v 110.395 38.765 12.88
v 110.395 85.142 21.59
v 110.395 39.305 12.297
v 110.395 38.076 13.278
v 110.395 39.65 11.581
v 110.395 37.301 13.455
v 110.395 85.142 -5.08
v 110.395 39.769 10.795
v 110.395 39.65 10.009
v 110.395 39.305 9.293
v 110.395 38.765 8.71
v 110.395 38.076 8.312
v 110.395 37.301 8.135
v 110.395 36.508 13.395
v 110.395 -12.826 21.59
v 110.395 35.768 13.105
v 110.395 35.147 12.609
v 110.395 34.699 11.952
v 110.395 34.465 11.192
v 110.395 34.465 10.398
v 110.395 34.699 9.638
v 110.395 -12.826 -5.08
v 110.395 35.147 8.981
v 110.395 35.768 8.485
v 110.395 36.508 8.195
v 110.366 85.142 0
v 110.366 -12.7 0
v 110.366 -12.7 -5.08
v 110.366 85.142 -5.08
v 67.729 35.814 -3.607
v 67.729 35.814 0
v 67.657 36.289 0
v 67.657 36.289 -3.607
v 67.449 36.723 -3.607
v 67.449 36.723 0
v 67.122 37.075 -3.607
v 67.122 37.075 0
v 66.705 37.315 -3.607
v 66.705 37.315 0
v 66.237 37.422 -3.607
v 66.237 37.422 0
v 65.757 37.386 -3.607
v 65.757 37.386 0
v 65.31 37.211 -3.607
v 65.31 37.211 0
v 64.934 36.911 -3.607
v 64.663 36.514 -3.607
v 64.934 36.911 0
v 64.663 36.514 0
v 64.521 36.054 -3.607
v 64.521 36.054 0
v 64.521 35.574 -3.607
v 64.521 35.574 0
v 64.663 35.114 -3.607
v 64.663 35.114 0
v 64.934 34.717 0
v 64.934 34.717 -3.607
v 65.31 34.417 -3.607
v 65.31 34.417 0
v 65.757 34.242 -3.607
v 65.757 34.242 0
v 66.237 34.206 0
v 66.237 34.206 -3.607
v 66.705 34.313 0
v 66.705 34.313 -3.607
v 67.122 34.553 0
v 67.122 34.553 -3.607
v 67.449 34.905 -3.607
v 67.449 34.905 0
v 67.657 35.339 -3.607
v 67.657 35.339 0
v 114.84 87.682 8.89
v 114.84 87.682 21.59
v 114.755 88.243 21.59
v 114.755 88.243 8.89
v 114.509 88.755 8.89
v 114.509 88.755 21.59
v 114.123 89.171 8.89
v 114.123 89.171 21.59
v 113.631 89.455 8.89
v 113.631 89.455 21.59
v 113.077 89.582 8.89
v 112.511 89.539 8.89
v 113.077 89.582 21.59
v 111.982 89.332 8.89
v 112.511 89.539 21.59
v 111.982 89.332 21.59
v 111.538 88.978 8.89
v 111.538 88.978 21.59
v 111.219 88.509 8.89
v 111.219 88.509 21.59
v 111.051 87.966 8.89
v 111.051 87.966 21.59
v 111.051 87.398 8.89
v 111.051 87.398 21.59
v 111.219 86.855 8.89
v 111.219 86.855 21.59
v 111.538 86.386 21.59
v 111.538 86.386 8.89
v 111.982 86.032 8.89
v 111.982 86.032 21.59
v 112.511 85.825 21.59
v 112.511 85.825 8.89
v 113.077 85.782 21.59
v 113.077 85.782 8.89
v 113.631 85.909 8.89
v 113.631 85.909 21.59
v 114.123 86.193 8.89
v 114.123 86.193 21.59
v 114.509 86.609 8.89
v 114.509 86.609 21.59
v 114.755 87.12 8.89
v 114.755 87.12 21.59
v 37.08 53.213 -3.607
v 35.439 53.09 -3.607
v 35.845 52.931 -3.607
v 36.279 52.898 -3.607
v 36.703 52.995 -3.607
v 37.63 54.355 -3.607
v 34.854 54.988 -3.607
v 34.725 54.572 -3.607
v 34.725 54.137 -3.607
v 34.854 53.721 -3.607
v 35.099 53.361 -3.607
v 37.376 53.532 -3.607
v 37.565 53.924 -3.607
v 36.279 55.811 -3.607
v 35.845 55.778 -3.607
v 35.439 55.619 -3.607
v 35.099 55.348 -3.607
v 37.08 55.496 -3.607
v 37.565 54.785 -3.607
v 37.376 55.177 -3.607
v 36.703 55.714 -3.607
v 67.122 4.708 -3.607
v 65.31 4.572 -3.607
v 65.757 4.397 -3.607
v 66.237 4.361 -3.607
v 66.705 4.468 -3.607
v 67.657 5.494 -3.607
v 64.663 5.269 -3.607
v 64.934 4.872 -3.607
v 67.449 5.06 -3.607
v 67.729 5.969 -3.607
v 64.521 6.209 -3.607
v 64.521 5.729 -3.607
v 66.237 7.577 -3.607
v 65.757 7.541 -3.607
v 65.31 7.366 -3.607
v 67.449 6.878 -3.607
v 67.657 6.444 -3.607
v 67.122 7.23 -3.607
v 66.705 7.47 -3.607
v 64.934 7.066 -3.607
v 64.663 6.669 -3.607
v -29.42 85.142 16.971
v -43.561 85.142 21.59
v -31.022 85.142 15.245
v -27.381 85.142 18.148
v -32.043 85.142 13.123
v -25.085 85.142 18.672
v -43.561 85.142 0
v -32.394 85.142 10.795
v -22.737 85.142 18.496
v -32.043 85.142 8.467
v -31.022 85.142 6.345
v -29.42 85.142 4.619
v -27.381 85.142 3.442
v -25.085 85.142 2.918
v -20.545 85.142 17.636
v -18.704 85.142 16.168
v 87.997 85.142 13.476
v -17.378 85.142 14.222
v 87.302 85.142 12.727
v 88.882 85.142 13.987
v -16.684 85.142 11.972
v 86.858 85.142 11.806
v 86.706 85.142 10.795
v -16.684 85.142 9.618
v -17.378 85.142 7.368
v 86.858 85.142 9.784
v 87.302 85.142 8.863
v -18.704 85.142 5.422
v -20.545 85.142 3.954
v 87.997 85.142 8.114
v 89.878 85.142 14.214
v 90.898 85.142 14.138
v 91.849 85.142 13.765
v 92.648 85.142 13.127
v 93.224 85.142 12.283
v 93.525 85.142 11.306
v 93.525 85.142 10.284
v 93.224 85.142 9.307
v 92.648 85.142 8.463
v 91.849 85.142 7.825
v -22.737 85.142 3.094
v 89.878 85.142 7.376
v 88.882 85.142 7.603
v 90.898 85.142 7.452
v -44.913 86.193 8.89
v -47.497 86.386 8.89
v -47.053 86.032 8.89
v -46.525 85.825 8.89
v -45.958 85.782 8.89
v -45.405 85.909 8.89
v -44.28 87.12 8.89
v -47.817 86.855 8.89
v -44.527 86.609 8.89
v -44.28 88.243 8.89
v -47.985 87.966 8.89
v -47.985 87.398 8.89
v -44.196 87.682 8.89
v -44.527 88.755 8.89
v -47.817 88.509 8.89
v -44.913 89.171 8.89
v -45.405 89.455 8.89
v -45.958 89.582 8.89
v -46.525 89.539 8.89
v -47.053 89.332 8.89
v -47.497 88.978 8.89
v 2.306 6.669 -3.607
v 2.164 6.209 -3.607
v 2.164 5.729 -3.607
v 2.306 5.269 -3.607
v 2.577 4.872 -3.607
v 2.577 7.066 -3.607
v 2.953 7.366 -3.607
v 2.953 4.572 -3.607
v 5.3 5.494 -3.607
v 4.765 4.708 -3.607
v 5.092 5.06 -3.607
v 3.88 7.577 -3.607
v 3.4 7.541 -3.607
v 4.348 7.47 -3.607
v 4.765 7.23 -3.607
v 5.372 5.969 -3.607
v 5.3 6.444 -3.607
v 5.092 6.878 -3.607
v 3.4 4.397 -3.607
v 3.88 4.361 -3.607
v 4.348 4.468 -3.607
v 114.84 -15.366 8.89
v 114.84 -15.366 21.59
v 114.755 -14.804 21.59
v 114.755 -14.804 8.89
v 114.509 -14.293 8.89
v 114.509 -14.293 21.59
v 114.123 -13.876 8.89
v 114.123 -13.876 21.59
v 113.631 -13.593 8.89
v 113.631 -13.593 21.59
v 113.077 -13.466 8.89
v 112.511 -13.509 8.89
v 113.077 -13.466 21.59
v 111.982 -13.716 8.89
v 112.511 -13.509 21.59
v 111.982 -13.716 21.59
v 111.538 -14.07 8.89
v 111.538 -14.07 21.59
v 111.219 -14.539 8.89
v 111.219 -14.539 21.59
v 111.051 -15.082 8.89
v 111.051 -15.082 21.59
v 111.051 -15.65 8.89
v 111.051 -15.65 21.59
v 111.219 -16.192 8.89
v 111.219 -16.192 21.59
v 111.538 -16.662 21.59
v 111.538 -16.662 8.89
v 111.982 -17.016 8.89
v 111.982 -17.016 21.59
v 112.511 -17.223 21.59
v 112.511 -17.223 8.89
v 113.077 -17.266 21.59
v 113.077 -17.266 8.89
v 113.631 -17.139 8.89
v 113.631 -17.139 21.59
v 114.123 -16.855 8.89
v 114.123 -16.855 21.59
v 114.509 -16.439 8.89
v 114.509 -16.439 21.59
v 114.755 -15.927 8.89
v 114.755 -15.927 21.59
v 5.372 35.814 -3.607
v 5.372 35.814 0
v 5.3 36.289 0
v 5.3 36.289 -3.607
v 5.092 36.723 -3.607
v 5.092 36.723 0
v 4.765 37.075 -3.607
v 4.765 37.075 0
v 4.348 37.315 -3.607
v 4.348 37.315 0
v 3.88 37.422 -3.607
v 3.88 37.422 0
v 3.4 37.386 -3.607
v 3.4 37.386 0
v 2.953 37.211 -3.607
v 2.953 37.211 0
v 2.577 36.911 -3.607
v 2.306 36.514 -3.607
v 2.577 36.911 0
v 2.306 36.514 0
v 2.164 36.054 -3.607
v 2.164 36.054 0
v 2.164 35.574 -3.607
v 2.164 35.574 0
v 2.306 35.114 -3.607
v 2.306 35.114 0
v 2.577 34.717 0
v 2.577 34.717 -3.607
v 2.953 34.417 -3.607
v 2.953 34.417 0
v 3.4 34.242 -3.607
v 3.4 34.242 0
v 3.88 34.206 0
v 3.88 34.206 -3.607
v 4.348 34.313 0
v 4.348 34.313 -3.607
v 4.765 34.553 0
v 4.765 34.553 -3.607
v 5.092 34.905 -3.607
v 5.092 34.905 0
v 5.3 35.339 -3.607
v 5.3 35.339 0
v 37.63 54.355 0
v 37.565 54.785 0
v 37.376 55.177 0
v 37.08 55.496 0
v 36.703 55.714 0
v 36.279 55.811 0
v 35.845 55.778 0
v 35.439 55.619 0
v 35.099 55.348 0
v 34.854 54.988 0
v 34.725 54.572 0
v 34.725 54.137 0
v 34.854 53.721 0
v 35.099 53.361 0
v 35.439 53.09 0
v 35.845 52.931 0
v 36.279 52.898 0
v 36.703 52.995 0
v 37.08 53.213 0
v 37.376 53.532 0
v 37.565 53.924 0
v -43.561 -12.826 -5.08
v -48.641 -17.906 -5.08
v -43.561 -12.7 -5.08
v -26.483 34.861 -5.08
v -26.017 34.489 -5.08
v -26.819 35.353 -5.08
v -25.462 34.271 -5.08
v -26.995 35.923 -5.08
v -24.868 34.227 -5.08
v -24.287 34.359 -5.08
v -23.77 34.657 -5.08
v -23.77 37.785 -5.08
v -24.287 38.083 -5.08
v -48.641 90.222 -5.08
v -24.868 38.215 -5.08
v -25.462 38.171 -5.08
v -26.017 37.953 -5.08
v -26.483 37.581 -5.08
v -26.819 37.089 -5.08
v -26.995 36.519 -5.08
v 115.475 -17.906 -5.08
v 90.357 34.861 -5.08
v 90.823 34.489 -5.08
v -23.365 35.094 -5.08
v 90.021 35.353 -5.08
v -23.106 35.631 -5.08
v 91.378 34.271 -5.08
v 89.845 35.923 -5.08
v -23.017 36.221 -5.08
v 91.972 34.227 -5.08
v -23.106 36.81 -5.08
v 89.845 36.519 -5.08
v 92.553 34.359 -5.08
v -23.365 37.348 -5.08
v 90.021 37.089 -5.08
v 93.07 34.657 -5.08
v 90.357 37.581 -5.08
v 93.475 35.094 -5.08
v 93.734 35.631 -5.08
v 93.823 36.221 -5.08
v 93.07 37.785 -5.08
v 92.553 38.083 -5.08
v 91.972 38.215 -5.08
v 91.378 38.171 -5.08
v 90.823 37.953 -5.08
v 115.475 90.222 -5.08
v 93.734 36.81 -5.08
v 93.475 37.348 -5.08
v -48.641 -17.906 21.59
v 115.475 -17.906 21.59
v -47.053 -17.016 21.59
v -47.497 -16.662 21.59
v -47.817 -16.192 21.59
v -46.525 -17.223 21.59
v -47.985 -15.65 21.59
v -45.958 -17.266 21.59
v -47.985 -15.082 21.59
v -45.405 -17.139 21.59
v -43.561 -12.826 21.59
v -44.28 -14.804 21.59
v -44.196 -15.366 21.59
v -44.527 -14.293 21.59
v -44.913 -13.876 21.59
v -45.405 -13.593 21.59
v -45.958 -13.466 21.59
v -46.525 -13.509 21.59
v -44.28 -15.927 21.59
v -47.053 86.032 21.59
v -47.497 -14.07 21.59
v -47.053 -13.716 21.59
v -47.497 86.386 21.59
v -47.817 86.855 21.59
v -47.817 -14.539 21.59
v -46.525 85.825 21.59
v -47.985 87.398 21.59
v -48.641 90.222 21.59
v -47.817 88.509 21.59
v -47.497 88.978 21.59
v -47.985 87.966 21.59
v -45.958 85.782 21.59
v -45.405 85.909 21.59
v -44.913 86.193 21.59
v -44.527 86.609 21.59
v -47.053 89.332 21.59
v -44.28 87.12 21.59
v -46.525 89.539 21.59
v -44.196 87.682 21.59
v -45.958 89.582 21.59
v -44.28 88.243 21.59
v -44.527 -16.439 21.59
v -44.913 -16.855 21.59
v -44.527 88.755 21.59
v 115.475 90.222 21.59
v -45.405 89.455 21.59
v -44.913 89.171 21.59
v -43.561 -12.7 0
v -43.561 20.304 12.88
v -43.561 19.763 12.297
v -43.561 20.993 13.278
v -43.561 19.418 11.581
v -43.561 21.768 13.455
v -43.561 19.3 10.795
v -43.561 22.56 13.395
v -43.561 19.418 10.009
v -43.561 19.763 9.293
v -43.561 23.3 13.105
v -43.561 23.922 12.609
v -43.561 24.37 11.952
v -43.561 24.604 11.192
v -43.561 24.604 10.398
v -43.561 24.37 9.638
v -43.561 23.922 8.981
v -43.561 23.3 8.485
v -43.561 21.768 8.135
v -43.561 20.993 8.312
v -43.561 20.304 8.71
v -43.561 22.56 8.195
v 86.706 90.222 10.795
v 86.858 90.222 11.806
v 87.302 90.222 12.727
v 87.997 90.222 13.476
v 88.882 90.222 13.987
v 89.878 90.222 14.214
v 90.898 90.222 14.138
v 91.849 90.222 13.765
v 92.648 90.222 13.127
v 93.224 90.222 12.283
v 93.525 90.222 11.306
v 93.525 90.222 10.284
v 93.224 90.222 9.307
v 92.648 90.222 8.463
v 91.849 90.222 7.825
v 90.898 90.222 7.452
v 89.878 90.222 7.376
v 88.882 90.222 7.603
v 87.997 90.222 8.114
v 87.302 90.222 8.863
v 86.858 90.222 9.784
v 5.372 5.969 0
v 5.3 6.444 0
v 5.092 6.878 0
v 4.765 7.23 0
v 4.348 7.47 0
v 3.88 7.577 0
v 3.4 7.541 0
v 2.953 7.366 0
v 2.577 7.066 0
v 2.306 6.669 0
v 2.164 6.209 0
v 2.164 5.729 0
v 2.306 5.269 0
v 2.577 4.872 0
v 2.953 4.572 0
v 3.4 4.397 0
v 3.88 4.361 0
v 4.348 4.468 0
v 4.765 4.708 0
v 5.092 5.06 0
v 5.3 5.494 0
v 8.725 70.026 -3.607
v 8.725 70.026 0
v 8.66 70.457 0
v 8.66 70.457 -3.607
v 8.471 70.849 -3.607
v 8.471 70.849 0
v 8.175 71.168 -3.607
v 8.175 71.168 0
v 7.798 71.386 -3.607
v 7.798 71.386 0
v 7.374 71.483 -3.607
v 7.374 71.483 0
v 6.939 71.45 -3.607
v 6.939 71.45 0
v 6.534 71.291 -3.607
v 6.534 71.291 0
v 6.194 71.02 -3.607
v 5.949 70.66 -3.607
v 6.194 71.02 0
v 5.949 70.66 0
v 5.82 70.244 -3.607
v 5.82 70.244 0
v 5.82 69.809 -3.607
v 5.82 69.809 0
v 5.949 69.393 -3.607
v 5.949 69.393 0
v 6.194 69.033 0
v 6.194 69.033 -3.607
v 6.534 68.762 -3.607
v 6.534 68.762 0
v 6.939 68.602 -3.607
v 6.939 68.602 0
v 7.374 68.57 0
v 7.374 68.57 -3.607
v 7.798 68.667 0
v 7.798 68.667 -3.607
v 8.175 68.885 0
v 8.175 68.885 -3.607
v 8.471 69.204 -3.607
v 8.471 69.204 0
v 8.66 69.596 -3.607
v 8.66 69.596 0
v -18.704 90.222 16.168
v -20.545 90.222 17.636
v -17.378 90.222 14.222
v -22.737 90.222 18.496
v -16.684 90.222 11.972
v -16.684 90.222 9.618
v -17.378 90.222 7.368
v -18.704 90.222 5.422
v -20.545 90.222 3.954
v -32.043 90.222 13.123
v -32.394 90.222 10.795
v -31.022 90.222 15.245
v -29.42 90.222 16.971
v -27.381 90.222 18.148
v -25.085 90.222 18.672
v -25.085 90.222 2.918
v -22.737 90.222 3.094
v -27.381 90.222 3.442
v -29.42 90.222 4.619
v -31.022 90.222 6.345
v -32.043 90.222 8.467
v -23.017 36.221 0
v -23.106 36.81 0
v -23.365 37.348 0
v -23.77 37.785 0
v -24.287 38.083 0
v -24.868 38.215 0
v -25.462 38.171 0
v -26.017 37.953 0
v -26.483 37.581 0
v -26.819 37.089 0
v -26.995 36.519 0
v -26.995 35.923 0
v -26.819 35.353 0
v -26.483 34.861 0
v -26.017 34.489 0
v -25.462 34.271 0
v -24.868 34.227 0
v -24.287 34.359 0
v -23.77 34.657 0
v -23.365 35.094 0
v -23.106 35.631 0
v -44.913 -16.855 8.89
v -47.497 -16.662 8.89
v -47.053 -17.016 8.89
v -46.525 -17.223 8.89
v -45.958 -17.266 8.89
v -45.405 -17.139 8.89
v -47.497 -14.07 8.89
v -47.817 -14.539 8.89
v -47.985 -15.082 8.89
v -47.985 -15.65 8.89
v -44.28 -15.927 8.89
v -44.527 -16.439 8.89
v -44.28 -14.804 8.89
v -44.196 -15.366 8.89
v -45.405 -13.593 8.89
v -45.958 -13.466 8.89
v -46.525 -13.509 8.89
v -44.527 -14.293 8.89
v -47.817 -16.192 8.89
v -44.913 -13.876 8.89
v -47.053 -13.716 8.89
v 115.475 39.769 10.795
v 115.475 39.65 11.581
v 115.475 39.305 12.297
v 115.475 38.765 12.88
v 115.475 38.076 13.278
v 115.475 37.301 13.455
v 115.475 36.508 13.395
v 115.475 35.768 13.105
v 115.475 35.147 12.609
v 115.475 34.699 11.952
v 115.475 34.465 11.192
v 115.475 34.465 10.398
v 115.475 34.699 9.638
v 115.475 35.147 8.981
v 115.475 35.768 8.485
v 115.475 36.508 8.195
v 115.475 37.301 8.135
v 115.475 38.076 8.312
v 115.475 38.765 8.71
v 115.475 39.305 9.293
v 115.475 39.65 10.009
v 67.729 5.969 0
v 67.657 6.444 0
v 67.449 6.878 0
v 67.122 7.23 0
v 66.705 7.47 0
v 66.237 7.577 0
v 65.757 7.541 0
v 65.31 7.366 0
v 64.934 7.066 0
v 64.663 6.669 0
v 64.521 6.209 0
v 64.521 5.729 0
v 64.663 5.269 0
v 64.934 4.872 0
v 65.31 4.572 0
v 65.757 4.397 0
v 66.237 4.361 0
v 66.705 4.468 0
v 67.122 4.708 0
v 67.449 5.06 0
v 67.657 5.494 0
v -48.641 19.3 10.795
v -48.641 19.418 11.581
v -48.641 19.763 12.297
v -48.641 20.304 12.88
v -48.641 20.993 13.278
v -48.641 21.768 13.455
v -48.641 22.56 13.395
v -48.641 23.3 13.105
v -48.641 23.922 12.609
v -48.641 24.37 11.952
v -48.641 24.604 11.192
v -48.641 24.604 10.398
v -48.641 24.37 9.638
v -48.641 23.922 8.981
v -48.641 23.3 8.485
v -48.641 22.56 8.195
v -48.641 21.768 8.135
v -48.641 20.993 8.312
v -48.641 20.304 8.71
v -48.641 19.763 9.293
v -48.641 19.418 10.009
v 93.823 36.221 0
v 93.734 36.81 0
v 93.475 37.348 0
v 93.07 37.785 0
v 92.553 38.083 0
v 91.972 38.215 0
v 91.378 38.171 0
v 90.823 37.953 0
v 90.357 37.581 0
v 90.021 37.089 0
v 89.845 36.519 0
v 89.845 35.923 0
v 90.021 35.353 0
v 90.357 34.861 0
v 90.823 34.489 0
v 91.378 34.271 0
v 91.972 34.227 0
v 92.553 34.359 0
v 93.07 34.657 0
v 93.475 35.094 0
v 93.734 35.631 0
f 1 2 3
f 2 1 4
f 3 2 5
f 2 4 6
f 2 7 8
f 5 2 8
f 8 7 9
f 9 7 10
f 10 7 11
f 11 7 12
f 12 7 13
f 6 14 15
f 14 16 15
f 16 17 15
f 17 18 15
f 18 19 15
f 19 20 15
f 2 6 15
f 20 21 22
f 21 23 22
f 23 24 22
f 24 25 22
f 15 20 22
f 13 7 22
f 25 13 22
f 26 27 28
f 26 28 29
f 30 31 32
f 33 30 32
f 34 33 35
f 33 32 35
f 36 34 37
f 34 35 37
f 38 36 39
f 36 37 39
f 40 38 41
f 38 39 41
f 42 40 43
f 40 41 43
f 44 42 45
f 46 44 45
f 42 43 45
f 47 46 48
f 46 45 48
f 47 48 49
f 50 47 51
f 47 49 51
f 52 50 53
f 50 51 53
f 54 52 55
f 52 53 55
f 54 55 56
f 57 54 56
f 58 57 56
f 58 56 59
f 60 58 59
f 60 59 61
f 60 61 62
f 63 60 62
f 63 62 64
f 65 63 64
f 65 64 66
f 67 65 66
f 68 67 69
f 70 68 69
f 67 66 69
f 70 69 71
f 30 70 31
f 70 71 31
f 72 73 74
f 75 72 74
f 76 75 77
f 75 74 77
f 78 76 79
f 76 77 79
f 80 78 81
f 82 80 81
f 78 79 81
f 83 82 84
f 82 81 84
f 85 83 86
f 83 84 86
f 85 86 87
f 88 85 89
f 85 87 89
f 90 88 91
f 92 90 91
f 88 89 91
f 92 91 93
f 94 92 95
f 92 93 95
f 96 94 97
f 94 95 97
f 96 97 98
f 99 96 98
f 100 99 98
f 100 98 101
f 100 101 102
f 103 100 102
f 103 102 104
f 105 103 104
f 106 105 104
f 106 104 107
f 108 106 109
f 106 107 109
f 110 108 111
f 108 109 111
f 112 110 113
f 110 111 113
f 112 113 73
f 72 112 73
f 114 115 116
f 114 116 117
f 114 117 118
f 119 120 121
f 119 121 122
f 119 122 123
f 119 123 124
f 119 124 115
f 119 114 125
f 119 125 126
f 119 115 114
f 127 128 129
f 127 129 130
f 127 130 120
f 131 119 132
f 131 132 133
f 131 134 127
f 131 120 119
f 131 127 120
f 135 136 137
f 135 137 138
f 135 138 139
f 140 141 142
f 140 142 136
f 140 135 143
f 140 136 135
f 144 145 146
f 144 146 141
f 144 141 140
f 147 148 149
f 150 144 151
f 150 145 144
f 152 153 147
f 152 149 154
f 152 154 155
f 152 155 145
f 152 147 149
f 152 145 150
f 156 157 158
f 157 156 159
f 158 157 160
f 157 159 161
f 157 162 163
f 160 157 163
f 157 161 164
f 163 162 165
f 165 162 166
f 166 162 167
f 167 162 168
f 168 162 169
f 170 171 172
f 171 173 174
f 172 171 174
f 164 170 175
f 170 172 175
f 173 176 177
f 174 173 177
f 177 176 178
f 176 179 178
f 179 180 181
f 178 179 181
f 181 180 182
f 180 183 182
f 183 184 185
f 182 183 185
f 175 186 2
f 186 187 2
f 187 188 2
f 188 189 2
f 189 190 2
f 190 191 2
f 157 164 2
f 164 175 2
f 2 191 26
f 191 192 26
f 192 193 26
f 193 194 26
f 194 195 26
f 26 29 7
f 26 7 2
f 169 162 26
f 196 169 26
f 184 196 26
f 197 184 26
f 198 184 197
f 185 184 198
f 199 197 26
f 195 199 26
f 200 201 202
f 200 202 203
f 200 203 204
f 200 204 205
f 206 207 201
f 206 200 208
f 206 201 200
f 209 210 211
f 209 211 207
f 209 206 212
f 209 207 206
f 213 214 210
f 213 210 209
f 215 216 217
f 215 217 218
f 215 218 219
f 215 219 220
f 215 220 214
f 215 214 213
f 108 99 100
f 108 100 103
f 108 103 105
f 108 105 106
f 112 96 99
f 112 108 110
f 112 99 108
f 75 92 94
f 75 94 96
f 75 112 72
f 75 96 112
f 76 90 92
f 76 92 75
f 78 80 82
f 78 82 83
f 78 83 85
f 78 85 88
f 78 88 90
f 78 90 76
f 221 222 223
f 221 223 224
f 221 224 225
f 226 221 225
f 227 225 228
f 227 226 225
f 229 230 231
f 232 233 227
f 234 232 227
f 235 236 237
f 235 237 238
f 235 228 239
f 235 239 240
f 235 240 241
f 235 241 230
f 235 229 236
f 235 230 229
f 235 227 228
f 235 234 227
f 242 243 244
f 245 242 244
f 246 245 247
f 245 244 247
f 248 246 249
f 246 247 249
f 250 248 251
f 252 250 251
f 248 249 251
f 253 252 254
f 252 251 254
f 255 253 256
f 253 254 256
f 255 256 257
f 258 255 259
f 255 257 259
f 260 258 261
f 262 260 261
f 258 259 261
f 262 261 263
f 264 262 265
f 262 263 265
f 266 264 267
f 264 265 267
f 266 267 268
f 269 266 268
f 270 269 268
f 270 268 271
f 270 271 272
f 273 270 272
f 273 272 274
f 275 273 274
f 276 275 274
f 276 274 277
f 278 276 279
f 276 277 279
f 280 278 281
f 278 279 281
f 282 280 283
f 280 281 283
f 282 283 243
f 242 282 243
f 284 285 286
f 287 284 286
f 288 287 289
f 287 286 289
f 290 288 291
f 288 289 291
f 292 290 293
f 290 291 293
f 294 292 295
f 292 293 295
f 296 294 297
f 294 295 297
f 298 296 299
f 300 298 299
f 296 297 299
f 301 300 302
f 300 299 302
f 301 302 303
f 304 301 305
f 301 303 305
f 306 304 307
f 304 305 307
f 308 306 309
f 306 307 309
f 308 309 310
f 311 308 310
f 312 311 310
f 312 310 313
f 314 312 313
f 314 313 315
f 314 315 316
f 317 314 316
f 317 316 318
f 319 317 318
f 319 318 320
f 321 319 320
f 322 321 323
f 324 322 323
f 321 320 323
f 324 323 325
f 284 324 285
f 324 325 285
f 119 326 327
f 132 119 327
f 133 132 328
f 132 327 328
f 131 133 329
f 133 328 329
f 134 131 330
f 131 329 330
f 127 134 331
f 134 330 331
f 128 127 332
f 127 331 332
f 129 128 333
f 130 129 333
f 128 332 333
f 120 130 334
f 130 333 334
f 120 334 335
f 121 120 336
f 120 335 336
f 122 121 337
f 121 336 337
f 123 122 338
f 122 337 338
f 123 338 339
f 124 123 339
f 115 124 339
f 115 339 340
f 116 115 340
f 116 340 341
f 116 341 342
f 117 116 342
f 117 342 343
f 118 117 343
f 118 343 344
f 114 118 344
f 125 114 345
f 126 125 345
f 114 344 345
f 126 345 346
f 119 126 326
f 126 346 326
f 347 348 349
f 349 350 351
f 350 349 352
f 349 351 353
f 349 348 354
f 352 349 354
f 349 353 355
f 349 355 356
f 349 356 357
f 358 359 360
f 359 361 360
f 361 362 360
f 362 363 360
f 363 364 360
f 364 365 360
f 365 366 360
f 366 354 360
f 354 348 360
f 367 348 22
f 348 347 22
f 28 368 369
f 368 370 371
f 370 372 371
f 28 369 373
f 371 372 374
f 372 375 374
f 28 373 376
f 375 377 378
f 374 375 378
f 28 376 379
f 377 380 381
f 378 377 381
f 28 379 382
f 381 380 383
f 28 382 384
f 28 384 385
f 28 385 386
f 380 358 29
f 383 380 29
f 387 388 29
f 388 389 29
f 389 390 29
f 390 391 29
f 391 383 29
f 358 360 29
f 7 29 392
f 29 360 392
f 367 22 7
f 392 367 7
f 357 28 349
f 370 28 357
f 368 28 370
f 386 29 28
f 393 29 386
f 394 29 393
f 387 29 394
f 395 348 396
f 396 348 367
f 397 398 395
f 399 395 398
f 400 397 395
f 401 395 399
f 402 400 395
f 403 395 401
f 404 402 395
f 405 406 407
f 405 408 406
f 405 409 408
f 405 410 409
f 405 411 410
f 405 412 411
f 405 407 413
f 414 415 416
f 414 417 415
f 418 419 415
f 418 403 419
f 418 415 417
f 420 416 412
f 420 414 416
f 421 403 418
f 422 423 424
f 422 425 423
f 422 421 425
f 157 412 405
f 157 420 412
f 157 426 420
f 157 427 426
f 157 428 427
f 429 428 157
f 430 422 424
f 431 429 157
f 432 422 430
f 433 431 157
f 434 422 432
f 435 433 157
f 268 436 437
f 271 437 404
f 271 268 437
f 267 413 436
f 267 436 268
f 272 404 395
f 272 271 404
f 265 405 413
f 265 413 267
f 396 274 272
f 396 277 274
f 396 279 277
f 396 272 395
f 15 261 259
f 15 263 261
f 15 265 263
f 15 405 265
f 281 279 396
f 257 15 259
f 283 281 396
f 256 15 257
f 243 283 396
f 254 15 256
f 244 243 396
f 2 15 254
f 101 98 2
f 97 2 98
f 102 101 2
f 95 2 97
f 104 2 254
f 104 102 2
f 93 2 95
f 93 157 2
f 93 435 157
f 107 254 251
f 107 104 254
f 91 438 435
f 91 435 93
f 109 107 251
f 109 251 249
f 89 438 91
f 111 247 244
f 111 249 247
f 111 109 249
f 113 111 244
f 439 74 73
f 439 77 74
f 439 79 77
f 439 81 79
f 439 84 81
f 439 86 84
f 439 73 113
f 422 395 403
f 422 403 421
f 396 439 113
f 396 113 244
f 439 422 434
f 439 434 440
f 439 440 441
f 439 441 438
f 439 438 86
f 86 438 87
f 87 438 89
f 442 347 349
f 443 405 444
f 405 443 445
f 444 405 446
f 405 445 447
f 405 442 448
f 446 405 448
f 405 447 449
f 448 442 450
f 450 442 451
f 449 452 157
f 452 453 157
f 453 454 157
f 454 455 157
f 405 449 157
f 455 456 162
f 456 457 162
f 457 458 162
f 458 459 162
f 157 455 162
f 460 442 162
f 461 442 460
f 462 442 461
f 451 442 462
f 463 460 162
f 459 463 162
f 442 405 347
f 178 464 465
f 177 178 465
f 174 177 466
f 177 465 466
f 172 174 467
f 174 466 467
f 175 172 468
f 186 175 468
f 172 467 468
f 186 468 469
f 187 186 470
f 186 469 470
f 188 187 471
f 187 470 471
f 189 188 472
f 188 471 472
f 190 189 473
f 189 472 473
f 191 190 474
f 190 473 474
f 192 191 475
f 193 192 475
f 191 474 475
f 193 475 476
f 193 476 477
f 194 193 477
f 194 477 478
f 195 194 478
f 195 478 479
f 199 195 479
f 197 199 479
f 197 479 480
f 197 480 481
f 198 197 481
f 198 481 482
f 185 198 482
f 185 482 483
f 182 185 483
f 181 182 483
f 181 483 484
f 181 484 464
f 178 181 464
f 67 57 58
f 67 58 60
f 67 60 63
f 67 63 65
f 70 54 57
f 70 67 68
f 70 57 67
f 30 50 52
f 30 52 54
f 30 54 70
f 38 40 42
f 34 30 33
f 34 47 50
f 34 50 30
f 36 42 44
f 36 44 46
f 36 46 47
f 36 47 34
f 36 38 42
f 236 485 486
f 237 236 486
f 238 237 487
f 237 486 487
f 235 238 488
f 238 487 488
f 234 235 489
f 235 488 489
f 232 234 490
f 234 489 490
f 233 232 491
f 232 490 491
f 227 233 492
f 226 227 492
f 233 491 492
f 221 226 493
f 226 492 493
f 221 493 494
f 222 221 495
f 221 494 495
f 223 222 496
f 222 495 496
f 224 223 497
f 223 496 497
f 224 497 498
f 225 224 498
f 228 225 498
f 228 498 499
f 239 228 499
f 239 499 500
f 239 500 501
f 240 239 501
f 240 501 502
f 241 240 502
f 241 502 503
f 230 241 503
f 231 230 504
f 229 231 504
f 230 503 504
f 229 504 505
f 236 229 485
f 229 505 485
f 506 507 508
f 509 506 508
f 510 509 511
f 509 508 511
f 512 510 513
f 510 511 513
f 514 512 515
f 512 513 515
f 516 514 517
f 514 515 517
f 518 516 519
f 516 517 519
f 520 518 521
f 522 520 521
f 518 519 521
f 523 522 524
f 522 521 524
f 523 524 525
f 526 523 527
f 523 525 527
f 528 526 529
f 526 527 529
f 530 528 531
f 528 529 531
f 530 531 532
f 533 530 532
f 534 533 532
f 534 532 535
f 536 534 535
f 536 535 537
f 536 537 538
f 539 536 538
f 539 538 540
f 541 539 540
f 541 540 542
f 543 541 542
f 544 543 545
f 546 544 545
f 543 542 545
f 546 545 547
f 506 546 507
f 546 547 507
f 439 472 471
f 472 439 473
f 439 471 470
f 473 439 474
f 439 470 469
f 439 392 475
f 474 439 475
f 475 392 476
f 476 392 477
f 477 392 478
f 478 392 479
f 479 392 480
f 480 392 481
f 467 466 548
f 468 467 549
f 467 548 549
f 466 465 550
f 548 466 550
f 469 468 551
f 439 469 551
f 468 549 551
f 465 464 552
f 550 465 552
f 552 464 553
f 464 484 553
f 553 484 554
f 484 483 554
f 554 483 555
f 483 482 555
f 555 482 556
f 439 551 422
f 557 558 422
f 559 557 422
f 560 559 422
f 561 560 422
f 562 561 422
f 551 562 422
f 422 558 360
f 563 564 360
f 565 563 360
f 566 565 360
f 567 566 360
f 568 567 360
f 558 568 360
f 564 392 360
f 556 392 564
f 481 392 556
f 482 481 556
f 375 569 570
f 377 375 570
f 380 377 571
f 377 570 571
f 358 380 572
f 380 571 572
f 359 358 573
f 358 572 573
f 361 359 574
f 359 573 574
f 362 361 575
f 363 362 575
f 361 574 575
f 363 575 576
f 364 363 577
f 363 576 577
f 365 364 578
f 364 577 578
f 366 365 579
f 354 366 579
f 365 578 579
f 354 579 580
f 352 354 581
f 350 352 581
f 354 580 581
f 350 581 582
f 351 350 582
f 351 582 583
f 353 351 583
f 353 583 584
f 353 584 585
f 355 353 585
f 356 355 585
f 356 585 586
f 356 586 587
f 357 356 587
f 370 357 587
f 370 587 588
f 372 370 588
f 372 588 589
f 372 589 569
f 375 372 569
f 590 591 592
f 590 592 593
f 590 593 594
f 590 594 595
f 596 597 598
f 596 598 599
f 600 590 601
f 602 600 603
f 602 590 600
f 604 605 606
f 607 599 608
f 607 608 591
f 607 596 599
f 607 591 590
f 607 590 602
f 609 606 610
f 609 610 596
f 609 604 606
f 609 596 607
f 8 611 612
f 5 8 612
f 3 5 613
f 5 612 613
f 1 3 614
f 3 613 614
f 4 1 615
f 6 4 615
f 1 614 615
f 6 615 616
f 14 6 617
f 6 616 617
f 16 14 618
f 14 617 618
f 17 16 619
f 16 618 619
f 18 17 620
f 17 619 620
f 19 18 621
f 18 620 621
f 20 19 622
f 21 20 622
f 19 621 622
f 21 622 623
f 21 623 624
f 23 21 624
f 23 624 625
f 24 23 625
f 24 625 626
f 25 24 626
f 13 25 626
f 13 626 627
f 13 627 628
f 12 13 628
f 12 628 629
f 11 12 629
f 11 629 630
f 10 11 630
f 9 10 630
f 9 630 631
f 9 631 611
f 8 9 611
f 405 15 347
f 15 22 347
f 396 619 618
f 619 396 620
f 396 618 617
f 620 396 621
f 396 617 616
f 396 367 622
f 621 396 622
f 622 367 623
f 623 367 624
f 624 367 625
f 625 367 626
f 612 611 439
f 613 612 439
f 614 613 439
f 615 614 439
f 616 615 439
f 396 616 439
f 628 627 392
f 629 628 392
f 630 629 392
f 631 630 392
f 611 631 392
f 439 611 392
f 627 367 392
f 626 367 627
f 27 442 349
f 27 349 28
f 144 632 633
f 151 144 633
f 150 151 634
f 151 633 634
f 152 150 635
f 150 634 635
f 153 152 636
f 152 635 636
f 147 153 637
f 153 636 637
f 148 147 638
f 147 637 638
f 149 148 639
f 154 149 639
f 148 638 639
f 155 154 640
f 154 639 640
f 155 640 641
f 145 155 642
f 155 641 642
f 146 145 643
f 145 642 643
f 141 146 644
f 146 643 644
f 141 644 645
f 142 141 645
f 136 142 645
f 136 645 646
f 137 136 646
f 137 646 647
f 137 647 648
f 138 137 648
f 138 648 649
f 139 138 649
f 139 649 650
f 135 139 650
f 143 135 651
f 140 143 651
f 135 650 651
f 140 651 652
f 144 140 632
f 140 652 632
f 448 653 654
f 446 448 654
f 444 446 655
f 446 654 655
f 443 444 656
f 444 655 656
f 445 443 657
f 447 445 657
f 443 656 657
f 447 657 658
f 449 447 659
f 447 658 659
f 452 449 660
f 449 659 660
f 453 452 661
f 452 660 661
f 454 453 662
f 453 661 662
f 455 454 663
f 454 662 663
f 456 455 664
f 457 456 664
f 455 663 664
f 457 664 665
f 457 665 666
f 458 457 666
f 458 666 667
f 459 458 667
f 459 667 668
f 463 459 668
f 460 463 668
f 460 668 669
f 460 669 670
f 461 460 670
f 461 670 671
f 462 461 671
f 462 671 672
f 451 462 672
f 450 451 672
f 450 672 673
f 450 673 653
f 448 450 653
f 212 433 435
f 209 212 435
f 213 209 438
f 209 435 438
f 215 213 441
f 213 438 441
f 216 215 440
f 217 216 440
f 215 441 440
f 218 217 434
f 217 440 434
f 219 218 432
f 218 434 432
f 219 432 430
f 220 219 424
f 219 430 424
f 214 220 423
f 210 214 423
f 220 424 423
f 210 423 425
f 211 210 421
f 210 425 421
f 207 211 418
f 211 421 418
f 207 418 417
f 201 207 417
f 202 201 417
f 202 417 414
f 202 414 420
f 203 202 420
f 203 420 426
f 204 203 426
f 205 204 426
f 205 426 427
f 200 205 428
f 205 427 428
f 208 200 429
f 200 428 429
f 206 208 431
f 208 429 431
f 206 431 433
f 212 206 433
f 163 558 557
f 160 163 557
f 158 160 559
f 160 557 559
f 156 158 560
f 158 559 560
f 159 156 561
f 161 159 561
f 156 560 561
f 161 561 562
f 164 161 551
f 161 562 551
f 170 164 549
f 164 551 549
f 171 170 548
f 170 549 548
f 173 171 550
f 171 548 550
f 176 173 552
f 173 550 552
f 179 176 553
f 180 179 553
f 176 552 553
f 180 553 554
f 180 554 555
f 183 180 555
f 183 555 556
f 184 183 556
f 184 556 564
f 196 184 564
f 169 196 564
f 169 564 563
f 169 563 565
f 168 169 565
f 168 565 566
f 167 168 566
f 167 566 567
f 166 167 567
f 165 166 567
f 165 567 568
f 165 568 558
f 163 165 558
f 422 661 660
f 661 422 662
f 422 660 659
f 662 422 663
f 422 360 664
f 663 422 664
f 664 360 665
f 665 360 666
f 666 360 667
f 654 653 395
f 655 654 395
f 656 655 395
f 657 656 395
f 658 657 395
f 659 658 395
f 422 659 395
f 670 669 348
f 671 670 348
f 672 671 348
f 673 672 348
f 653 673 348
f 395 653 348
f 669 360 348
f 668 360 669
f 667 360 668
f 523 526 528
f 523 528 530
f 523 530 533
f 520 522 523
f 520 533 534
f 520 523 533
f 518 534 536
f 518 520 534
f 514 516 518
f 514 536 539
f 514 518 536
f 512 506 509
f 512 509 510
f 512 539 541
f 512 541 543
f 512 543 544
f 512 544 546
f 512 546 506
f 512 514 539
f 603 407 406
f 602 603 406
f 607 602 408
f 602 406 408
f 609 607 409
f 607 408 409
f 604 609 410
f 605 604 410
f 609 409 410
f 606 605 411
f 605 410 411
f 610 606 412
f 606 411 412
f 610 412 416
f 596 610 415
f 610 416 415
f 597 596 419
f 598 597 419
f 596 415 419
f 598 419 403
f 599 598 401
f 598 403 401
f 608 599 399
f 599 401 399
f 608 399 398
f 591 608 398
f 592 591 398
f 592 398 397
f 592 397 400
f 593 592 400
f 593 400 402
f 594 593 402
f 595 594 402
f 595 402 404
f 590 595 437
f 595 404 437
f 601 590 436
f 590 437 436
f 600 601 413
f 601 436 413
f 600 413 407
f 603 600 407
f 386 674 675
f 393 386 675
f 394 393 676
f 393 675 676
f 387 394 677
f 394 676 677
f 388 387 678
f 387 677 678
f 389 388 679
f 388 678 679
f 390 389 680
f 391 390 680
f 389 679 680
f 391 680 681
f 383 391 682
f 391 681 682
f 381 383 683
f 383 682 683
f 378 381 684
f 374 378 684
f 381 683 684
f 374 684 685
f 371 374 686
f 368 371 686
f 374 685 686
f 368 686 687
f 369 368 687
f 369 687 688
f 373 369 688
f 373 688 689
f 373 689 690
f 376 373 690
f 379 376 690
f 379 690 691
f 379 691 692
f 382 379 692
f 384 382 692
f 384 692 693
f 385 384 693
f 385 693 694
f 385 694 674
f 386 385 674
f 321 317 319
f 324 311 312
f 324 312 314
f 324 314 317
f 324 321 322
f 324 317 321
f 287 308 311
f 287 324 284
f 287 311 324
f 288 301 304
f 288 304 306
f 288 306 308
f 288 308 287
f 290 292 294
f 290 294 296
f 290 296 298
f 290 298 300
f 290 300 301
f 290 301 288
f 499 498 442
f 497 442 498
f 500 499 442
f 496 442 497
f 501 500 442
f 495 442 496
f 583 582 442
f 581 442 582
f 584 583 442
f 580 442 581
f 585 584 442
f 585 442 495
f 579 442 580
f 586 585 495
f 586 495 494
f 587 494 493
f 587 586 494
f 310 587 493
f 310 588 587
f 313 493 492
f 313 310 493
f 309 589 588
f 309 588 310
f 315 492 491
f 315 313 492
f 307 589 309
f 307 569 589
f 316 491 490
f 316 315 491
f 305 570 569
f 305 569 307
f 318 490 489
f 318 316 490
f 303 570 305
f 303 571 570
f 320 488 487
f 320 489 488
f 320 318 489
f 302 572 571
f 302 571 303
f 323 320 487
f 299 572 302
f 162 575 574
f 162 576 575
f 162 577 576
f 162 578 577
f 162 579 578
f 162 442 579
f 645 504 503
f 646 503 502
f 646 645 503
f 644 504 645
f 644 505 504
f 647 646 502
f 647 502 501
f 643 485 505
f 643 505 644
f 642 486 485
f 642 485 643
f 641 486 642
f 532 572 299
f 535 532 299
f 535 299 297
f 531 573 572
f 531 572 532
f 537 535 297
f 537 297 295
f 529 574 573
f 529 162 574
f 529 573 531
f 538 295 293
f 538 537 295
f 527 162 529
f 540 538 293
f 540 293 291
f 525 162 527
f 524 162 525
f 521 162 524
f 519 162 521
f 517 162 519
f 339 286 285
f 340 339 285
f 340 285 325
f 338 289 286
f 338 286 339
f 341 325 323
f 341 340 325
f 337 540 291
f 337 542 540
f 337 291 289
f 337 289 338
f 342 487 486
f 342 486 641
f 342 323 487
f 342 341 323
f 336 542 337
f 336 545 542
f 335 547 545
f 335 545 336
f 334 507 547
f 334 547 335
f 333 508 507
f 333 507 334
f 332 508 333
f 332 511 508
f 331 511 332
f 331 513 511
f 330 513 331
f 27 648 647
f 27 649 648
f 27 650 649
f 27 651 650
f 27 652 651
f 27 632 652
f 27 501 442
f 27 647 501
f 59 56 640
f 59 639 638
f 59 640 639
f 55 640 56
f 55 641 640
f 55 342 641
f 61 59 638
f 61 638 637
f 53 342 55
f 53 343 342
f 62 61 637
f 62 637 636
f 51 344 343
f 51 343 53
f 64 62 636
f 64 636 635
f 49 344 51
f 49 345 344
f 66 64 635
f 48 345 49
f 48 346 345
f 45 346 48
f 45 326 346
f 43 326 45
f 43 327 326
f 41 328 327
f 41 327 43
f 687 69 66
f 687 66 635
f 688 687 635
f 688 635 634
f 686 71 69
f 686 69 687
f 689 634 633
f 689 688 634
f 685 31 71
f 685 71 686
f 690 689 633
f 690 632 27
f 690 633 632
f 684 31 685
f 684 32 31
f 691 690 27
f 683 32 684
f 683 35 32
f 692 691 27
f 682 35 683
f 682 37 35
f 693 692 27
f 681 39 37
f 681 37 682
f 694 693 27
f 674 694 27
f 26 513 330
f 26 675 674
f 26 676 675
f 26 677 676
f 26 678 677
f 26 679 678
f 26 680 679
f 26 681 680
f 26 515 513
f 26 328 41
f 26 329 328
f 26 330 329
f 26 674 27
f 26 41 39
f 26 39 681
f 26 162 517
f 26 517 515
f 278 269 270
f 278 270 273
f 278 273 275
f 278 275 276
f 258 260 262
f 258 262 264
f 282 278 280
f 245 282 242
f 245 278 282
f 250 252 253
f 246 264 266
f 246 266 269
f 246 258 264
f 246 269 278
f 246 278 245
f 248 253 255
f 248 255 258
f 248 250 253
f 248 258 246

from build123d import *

# Parameters (mm, degrees)
F3_DEPTH  = 5.08
F6_DEPTH  = 5.08
F7_DEPTH  = 21.59
F8_R      = 7.8994
F9_DEPTH  = 25.4
F10_R     = 3.429
F11_DEPTH = 25.4
F12_R     = 2.667
F13_DEPTH = 25.4
F14_R     = 2.667
F15_DEPTH = 25.4
F1_R      = 1.4605
F16_DEPTH = 3.6068
F0_R      = 1.6129
F17_DEPTH = 3.6068
F18_R     = 1.905
F19_DEPTH = 12.7
F20_R     = 2
F21_DEPTH = 25.4


with BuildPart() as f3:
    # F2 (on Top) → F3 (new body)
    with BuildSketch(Plane.XY):
        Polygon((-43.589437, -12.7), (0, -12.7), (110.36633, -12.7), (110.36633, 85.2678), (0, 85.2678), (-43.589437, 85.2678), (-43.589437, 72.5678), (-43.589437, 0), align=None)
    extrude(amount=-F3_DEPTH)

    # F4 (on Top) → F6 (join)
    with BuildSketch(Plane.XY):
        Polygon((110.394933, 90.221972), (-5.796864, 90.221972), (-43.560833, 90.221972), (-48.640833, 90.221972), (-48.640833, 85.141972), (-48.640833, -12.825828), (-48.640833, -17.905828), (-43.560833, -17.905828), (-5.796864, -17.905828), (110.394933, -17.905828), (115.474933, -17.905828), (115.474933, -12.825828), (115.474933, 85.141972), (115.474933, 90.221972), align=None)
        Polygon((110.394933, -12.825828), (-5.796864, -12.825828), (-43.560833, -12.825828), (-43.560833, 85.141972), (-5.796864, 85.141972), (110.394933, 85.141972), align=None, mode=Mode.SUBTRACT)
    extrude(amount=-F6_DEPTH)

    # F5 (on face) → F7 (join)
    with BuildSketch(Plane.XY):
        Polygon((110.394933, 90.221972), (-5.796864, 90.221972), (-43.560833, 90.221972), (-48.640833, 90.221972), (-48.640833, 85.141972), (-48.640833, -12.825828), (-48.640833, -17.905828), (-43.560833, -17.905828), (-5.796864, -17.905828), (110.394933, -17.905828), (115.474933, -17.905828), (115.474933, 48.9839), (115.474933, 90.221972), align=None)
        Polygon((110.394933, -12.825828), (-5.796864, -12.825828), (-43.560833, -12.825828), (-43.560833, 85.141972), (-5.796864, 85.141972), (110.394933, 85.141972), align=None, mode=Mode.SUBTRACT)
    extrude(amount=F7_DEPTH)

    # F8 (on face) → F9 (cut)
    with BuildSketch(Plane(origin=(0, 90.221972, 0), x_dir=(-1, 0, 0), z_dir=(0, 1, 0))):
        with Locations((24.494825, 10.795)):
            Circle(F8_R)
    extrude(amount=-F9_DEPTH, mode=Mode.SUBTRACT)

    # F10 (on face) → F11 (cut)
    with BuildSketch(Plane(origin=(0, 90.221972, 0), x_dir=(-1, 0, 0), z_dir=(0, 1, 0))):
        with Locations((-90.13474, 10.795)):
            Circle(F10_R)
    extrude(amount=-F11_DEPTH, mode=Mode.SUBTRACT)

    # F12 (on face) → F13 (cut)
    with BuildSketch(Plane(origin=(-48.640833, 0, 0), x_dir=(0, -1, 0), z_dir=(-1, 0, 0))):
        with Locations((-21.966936, 10.795)):
            Circle(F12_R)
    extrude(amount=-F13_DEPTH, mode=Mode.SUBTRACT)

    # F14 (on face) → F15 (cut)
    with BuildSketch(Plane.YZ.offset(115.474933)):
        with Locations((37.101891, 10.795)):
            Circle(F14_R)
    extrude(amount=-F15_DEPTH, mode=Mode.SUBTRACT)

    # F1 (on Top) → F16 (cut)
    with BuildSketch(Plane.XY):
        with Locations((7.2644, 70.026379)):
            Circle(F1_R)
        with Locations((36.1696, 54.354579)):
            Circle(F1_R)
    extrude(amount=-F16_DEPTH, mode=Mode.SUBTRACT)

    # F0 (on Top) → F17 (cut)
    with BuildSketch(Plane.XY):
        with Locations((3.7592, 35.814)):
            Circle(F0_R)
        with Locations((3.7592, 5.969)):
            Circle(F0_R)
        with Locations((66.1162, 5.969)):
            Circle(F0_R)
        with Locations((66.1162, 35.814)):
            Circle(F0_R)
    extrude(amount=-F17_DEPTH, mode=Mode.SUBTRACT)

    # F18 (on face) → F19 (cut)
    with BuildSketch(Plane.XY.offset(21.59)):
        with Locations((-46.100833, -15.365828)):
            Circle(F18_R)
        with Locations((-46.100833, 87.681972)):
            Circle(F18_R)
        with Locations((112.934933, 87.681972)):
            Circle(F18_R)
        with Locations((112.934933, -15.365828)):
            Circle(F18_R)
    extrude(amount=-F19_DEPTH, mode=Mode.SUBTRACT)

    # F20 (on face) → F21 (cut)
    with BuildSketch(Plane.XY):
        with Locations((-25.017252, 36.220986)):
            Circle(F20_R)
        with Locations((91.822748, 36.220986)):
            Circle(F20_R)
    extrude(amount=-F21_DEPTH, mode=Mode.SUBTRACT)


solid = f3.part
